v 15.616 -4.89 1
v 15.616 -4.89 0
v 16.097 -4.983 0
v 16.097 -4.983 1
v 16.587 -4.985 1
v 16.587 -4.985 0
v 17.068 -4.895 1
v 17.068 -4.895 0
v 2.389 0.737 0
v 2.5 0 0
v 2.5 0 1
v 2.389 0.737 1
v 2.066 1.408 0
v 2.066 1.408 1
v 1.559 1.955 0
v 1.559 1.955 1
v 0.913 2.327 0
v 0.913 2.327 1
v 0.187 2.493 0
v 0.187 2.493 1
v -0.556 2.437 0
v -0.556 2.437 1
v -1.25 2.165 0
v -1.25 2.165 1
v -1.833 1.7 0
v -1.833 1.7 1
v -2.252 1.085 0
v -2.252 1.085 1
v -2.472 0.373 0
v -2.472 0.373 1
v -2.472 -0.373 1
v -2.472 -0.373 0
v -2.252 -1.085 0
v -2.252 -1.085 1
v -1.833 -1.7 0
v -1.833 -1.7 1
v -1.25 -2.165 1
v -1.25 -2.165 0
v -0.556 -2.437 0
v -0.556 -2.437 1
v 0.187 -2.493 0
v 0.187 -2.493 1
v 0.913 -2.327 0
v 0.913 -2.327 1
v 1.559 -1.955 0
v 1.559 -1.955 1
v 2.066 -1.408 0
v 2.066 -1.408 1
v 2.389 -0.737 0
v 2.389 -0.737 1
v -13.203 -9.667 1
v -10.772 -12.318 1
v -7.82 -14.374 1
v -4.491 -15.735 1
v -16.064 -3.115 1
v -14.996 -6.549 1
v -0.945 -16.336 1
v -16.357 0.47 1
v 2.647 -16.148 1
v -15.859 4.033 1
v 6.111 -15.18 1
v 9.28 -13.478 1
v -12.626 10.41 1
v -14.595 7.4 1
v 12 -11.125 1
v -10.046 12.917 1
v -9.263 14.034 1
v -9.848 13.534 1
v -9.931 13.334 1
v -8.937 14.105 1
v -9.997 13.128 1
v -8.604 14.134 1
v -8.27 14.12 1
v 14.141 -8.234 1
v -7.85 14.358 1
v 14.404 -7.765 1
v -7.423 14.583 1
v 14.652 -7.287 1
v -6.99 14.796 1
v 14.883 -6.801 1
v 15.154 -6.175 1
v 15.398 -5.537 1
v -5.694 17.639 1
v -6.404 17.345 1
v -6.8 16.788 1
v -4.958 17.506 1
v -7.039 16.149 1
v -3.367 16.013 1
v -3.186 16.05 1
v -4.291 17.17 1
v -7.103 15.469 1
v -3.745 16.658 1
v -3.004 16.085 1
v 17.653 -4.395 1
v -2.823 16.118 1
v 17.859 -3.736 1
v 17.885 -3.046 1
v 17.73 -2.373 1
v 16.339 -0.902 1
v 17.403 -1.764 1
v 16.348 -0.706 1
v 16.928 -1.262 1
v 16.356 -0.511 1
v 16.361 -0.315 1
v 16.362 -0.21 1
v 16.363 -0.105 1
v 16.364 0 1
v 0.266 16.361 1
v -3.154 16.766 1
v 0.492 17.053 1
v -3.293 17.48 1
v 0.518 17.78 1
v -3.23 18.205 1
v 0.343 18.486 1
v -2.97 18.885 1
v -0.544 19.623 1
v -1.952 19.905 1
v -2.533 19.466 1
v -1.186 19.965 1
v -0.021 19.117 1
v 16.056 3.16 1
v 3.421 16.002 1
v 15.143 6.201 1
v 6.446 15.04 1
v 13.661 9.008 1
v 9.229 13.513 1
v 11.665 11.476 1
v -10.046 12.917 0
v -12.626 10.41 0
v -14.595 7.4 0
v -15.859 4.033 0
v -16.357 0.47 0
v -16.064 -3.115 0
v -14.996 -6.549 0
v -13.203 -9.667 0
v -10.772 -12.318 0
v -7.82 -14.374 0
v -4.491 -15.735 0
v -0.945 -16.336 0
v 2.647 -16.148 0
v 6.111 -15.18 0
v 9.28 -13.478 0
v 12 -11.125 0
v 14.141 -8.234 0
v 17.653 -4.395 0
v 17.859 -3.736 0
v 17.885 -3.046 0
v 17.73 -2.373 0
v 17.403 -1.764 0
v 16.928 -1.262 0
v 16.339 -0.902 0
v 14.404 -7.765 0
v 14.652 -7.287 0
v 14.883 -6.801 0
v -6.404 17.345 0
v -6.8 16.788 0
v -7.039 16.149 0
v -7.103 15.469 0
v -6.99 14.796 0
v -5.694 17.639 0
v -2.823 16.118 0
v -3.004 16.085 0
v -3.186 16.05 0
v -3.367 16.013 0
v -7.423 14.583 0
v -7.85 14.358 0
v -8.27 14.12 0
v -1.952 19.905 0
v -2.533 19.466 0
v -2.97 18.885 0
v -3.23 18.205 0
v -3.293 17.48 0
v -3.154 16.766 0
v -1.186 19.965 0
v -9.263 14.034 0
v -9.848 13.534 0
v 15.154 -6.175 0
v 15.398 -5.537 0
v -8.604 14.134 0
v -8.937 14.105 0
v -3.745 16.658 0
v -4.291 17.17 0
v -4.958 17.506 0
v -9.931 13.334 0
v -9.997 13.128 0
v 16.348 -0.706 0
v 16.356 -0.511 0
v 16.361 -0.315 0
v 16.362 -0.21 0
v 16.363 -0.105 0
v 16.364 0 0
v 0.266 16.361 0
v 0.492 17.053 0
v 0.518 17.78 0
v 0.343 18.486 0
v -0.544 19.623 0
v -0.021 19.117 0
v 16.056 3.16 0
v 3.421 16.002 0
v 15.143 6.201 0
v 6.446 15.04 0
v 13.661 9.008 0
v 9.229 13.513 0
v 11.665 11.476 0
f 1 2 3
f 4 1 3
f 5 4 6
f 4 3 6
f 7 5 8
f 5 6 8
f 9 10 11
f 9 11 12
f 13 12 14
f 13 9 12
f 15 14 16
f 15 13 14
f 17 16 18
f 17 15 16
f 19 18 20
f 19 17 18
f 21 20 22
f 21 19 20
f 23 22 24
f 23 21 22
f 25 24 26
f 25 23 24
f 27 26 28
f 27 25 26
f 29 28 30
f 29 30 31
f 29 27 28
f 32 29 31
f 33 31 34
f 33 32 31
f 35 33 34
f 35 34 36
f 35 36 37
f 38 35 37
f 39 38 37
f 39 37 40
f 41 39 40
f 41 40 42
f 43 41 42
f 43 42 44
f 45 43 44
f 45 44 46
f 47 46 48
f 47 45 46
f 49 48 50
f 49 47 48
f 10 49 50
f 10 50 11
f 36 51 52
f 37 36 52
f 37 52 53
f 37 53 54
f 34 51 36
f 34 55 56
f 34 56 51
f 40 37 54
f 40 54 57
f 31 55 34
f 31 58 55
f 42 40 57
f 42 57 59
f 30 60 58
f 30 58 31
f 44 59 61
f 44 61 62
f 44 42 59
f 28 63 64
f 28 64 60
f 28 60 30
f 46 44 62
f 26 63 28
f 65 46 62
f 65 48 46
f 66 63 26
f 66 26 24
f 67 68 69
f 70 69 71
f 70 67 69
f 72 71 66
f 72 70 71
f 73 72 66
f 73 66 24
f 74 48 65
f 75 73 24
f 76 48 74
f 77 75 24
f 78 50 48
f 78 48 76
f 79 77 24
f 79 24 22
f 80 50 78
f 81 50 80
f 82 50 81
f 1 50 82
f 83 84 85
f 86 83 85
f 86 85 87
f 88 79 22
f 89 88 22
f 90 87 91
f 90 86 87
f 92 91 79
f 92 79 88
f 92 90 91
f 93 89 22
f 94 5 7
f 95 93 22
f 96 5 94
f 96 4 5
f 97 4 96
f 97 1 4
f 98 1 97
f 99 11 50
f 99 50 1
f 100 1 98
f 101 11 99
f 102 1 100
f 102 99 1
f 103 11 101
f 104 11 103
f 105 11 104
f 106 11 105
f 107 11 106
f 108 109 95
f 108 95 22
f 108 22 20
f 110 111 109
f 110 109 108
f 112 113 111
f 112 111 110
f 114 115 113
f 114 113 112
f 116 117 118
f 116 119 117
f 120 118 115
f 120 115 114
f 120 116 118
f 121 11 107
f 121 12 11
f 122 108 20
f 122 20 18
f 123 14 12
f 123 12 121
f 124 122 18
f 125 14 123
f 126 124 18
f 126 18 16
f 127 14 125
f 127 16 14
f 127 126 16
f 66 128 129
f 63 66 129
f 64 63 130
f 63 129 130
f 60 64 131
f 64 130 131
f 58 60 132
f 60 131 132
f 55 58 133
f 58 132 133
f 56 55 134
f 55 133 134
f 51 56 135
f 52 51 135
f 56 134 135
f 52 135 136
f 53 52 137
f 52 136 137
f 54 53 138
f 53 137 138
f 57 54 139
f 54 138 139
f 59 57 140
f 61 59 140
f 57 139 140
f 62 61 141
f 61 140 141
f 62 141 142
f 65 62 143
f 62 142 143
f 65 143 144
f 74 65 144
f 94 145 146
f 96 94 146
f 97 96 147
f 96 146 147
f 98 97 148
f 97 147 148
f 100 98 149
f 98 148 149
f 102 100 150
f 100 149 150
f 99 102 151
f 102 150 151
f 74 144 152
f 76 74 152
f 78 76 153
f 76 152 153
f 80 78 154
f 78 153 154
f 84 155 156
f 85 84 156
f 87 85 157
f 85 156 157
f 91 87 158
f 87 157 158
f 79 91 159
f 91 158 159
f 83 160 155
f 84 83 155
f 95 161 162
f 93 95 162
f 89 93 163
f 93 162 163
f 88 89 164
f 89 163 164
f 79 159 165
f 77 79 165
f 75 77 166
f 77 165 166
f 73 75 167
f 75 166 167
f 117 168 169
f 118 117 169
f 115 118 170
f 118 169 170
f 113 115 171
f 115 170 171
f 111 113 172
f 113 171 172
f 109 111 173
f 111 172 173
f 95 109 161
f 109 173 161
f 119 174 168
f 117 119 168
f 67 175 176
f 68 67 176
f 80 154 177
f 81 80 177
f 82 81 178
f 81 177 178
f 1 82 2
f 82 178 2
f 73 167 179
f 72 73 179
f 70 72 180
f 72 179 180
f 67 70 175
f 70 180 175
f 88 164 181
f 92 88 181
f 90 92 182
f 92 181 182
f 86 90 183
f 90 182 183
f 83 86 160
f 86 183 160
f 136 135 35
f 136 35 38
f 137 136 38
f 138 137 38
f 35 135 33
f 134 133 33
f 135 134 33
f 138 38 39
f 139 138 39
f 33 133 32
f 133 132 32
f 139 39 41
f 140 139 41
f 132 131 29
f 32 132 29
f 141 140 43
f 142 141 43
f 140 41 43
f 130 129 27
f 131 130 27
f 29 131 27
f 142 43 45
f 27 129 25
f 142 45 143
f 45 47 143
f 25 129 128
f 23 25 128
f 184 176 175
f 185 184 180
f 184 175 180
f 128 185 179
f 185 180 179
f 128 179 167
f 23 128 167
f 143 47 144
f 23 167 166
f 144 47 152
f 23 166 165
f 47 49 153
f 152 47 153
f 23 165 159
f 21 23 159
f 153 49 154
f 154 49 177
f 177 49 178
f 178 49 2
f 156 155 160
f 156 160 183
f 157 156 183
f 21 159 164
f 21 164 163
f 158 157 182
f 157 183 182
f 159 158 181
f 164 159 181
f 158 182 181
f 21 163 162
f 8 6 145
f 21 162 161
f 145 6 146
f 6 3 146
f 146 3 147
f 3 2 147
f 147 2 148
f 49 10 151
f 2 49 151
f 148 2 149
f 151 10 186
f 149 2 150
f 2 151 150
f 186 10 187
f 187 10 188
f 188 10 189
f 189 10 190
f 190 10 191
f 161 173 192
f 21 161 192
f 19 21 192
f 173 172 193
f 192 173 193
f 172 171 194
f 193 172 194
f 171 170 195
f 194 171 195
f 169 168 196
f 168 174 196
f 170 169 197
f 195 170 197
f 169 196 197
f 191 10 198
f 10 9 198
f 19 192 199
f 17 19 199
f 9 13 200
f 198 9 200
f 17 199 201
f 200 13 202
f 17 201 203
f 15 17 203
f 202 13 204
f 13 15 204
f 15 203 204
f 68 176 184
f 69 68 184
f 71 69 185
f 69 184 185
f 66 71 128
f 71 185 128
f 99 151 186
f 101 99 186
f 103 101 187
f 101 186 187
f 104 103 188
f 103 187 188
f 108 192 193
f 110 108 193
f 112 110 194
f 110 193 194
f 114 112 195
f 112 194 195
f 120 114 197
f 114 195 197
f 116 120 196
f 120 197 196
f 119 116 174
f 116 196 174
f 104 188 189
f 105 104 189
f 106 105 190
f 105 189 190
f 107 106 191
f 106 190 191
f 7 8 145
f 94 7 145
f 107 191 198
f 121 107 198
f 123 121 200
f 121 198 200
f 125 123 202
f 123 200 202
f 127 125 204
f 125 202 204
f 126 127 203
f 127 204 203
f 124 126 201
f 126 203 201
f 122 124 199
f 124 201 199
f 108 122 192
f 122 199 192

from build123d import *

# Parameters (mm, degrees)
F1_R     = 2.5
F2_DEPTH = 1


with BuildPart() as f2:
    # F1 (on Top) → F2 (new body)
    with BuildSketch(Plane.XY):
        with BuildLine():
            ThreePointArc((-2.8225697973, 16.1183651398), (-1.2838761119, 16.3131927338), (0.2663514513, 16.3614685143))
            ThreePointArc((0.2663514513, 16.3614685143), (0.3425890016, 18.4864230236), (-1.1856698611, 19.9648237403))
            Line((-1.1856698611, 19.9648237403), (-1.9521142238, 19.9045032607))
            ThreePointArc((-1.9521142238, 19.9045032607), (-3.2302848587, 18.2052317525), (-2.8225697973, 16.1183651398))
        make_face()
        with BuildLine():
            ThreePointArc((16.360600111, -0.3152127039), (16.3628772829, -0.1576136634), (16.3636363636, 0))
            ThreePointArc((16.3636363636, 0), (11.6646275838, 11.4762824283), (0.2663514513, 16.3614685143))
            ThreePointArc((0.2663514513, 16.3614685143), (-1.2838761119, 16.3131927338), (-2.8225697973, 16.1183651398))
            ThreePointArc((-2.8225697973, 16.1183651398), (-3.0952881484, 16.0682228737), (-3.3671176898, 16.0134666298))
            ThreePointArc((-3.3671176898, 16.0134666298), (-5.2140285038, 15.5107221561), (-6.9895966639, 14.7957471429))
            ThreePointArc((-6.9895966639, 14.7957471429), (-7.637404231, 14.4719954275), (-8.2702526578, 14.1198978756))
            ThreePointArc((-8.2702526578, 14.1198978756), (-9.1779617865, 13.5474577869), (-10.0461981882, 12.9167525719))
            ThreePointArc((-10.0461981882, 12.9167525719), (-10.7718419373, -12.3181174016), (14.1409449401, -8.2342134562))
            ThreePointArc((14.1409449401, -8.2342134562), (14.5297243379, -7.5269984527), (14.8831626027, -6.8014752798))
            ThreePointArc((14.8831626027, -6.8014752798), (15.2794397939, -5.8572446275), (15.6158812541, -4.8900764513))
            ThreePointArc((15.6158812541, -4.8900764513), (16.1012982128, -2.9183541432), (16.3387742935, -0.9016926457))
            ThreePointArc((16.3387742935, -0.9016926457), (16.352316695, -0.6085505312), (16.360600111, -0.3152127039))
        make_face()
        Circle(F1_R, mode=Mode.SUBTRACT)
        with BuildLine():
            ThreePointArc((-6.9895966639, 14.7957471429), (-5.2140285038, 15.5107221561), (-3.3671176898, 16.0134666298))
            ThreePointArc((-3.3671176898, 16.0134666298), (-4.2906994467, 17.1695948436), (-5.6940409736, 17.6389223059))
            Line((-5.6940409736, 17.6389223059), (-6.4043328259, 17.3447097874))
            ThreePointArc((-6.4043328259, 17.3447097874), (-7.0387105861, 16.1486962619), (-6.9895966639, 14.7957471429))
        make_face()
        with BuildLine():
            ThreePointArc((-10.0461981882, 12.9167525719), (-9.1779617865, 13.5474577869), (-8.2702526578, 14.1198978756))
            ThreePointArc((-8.2702526578, 14.1198978756), (-8.7707794497, 14.1245479657), (-9.2630136276, 14.0336952997))
            Line((-9.2630136276, 14.0336952997), (-9.847624654, 13.5343903136))
            ThreePointArc((-9.847624654, 13.5343903136), (-9.9661500626, 13.2317567594), (-10.0461981882, 12.9167525719))
        make_face()
        with BuildLine():
            ThreePointArc((17.6530775237, -4.3953792078), (17.7296643017, -2.3725080911), (16.3387742935, -0.9016926457))
            ThreePointArc((16.3387742935, -0.9016926457), (16.1012982128, -2.9183541432), (15.6158812541, -4.8900764513))
            ThreePointArc((15.6158812541, -4.8900764513), (16.3418473368, -4.9953212922), (17.0684664973, -4.894684194))
            Line((17.0684664973, -4.894684194), (17.6530775237, -4.3953792078))
        make_face()
    extrude(amount=F2_DEPTH)


solid = f2.part
